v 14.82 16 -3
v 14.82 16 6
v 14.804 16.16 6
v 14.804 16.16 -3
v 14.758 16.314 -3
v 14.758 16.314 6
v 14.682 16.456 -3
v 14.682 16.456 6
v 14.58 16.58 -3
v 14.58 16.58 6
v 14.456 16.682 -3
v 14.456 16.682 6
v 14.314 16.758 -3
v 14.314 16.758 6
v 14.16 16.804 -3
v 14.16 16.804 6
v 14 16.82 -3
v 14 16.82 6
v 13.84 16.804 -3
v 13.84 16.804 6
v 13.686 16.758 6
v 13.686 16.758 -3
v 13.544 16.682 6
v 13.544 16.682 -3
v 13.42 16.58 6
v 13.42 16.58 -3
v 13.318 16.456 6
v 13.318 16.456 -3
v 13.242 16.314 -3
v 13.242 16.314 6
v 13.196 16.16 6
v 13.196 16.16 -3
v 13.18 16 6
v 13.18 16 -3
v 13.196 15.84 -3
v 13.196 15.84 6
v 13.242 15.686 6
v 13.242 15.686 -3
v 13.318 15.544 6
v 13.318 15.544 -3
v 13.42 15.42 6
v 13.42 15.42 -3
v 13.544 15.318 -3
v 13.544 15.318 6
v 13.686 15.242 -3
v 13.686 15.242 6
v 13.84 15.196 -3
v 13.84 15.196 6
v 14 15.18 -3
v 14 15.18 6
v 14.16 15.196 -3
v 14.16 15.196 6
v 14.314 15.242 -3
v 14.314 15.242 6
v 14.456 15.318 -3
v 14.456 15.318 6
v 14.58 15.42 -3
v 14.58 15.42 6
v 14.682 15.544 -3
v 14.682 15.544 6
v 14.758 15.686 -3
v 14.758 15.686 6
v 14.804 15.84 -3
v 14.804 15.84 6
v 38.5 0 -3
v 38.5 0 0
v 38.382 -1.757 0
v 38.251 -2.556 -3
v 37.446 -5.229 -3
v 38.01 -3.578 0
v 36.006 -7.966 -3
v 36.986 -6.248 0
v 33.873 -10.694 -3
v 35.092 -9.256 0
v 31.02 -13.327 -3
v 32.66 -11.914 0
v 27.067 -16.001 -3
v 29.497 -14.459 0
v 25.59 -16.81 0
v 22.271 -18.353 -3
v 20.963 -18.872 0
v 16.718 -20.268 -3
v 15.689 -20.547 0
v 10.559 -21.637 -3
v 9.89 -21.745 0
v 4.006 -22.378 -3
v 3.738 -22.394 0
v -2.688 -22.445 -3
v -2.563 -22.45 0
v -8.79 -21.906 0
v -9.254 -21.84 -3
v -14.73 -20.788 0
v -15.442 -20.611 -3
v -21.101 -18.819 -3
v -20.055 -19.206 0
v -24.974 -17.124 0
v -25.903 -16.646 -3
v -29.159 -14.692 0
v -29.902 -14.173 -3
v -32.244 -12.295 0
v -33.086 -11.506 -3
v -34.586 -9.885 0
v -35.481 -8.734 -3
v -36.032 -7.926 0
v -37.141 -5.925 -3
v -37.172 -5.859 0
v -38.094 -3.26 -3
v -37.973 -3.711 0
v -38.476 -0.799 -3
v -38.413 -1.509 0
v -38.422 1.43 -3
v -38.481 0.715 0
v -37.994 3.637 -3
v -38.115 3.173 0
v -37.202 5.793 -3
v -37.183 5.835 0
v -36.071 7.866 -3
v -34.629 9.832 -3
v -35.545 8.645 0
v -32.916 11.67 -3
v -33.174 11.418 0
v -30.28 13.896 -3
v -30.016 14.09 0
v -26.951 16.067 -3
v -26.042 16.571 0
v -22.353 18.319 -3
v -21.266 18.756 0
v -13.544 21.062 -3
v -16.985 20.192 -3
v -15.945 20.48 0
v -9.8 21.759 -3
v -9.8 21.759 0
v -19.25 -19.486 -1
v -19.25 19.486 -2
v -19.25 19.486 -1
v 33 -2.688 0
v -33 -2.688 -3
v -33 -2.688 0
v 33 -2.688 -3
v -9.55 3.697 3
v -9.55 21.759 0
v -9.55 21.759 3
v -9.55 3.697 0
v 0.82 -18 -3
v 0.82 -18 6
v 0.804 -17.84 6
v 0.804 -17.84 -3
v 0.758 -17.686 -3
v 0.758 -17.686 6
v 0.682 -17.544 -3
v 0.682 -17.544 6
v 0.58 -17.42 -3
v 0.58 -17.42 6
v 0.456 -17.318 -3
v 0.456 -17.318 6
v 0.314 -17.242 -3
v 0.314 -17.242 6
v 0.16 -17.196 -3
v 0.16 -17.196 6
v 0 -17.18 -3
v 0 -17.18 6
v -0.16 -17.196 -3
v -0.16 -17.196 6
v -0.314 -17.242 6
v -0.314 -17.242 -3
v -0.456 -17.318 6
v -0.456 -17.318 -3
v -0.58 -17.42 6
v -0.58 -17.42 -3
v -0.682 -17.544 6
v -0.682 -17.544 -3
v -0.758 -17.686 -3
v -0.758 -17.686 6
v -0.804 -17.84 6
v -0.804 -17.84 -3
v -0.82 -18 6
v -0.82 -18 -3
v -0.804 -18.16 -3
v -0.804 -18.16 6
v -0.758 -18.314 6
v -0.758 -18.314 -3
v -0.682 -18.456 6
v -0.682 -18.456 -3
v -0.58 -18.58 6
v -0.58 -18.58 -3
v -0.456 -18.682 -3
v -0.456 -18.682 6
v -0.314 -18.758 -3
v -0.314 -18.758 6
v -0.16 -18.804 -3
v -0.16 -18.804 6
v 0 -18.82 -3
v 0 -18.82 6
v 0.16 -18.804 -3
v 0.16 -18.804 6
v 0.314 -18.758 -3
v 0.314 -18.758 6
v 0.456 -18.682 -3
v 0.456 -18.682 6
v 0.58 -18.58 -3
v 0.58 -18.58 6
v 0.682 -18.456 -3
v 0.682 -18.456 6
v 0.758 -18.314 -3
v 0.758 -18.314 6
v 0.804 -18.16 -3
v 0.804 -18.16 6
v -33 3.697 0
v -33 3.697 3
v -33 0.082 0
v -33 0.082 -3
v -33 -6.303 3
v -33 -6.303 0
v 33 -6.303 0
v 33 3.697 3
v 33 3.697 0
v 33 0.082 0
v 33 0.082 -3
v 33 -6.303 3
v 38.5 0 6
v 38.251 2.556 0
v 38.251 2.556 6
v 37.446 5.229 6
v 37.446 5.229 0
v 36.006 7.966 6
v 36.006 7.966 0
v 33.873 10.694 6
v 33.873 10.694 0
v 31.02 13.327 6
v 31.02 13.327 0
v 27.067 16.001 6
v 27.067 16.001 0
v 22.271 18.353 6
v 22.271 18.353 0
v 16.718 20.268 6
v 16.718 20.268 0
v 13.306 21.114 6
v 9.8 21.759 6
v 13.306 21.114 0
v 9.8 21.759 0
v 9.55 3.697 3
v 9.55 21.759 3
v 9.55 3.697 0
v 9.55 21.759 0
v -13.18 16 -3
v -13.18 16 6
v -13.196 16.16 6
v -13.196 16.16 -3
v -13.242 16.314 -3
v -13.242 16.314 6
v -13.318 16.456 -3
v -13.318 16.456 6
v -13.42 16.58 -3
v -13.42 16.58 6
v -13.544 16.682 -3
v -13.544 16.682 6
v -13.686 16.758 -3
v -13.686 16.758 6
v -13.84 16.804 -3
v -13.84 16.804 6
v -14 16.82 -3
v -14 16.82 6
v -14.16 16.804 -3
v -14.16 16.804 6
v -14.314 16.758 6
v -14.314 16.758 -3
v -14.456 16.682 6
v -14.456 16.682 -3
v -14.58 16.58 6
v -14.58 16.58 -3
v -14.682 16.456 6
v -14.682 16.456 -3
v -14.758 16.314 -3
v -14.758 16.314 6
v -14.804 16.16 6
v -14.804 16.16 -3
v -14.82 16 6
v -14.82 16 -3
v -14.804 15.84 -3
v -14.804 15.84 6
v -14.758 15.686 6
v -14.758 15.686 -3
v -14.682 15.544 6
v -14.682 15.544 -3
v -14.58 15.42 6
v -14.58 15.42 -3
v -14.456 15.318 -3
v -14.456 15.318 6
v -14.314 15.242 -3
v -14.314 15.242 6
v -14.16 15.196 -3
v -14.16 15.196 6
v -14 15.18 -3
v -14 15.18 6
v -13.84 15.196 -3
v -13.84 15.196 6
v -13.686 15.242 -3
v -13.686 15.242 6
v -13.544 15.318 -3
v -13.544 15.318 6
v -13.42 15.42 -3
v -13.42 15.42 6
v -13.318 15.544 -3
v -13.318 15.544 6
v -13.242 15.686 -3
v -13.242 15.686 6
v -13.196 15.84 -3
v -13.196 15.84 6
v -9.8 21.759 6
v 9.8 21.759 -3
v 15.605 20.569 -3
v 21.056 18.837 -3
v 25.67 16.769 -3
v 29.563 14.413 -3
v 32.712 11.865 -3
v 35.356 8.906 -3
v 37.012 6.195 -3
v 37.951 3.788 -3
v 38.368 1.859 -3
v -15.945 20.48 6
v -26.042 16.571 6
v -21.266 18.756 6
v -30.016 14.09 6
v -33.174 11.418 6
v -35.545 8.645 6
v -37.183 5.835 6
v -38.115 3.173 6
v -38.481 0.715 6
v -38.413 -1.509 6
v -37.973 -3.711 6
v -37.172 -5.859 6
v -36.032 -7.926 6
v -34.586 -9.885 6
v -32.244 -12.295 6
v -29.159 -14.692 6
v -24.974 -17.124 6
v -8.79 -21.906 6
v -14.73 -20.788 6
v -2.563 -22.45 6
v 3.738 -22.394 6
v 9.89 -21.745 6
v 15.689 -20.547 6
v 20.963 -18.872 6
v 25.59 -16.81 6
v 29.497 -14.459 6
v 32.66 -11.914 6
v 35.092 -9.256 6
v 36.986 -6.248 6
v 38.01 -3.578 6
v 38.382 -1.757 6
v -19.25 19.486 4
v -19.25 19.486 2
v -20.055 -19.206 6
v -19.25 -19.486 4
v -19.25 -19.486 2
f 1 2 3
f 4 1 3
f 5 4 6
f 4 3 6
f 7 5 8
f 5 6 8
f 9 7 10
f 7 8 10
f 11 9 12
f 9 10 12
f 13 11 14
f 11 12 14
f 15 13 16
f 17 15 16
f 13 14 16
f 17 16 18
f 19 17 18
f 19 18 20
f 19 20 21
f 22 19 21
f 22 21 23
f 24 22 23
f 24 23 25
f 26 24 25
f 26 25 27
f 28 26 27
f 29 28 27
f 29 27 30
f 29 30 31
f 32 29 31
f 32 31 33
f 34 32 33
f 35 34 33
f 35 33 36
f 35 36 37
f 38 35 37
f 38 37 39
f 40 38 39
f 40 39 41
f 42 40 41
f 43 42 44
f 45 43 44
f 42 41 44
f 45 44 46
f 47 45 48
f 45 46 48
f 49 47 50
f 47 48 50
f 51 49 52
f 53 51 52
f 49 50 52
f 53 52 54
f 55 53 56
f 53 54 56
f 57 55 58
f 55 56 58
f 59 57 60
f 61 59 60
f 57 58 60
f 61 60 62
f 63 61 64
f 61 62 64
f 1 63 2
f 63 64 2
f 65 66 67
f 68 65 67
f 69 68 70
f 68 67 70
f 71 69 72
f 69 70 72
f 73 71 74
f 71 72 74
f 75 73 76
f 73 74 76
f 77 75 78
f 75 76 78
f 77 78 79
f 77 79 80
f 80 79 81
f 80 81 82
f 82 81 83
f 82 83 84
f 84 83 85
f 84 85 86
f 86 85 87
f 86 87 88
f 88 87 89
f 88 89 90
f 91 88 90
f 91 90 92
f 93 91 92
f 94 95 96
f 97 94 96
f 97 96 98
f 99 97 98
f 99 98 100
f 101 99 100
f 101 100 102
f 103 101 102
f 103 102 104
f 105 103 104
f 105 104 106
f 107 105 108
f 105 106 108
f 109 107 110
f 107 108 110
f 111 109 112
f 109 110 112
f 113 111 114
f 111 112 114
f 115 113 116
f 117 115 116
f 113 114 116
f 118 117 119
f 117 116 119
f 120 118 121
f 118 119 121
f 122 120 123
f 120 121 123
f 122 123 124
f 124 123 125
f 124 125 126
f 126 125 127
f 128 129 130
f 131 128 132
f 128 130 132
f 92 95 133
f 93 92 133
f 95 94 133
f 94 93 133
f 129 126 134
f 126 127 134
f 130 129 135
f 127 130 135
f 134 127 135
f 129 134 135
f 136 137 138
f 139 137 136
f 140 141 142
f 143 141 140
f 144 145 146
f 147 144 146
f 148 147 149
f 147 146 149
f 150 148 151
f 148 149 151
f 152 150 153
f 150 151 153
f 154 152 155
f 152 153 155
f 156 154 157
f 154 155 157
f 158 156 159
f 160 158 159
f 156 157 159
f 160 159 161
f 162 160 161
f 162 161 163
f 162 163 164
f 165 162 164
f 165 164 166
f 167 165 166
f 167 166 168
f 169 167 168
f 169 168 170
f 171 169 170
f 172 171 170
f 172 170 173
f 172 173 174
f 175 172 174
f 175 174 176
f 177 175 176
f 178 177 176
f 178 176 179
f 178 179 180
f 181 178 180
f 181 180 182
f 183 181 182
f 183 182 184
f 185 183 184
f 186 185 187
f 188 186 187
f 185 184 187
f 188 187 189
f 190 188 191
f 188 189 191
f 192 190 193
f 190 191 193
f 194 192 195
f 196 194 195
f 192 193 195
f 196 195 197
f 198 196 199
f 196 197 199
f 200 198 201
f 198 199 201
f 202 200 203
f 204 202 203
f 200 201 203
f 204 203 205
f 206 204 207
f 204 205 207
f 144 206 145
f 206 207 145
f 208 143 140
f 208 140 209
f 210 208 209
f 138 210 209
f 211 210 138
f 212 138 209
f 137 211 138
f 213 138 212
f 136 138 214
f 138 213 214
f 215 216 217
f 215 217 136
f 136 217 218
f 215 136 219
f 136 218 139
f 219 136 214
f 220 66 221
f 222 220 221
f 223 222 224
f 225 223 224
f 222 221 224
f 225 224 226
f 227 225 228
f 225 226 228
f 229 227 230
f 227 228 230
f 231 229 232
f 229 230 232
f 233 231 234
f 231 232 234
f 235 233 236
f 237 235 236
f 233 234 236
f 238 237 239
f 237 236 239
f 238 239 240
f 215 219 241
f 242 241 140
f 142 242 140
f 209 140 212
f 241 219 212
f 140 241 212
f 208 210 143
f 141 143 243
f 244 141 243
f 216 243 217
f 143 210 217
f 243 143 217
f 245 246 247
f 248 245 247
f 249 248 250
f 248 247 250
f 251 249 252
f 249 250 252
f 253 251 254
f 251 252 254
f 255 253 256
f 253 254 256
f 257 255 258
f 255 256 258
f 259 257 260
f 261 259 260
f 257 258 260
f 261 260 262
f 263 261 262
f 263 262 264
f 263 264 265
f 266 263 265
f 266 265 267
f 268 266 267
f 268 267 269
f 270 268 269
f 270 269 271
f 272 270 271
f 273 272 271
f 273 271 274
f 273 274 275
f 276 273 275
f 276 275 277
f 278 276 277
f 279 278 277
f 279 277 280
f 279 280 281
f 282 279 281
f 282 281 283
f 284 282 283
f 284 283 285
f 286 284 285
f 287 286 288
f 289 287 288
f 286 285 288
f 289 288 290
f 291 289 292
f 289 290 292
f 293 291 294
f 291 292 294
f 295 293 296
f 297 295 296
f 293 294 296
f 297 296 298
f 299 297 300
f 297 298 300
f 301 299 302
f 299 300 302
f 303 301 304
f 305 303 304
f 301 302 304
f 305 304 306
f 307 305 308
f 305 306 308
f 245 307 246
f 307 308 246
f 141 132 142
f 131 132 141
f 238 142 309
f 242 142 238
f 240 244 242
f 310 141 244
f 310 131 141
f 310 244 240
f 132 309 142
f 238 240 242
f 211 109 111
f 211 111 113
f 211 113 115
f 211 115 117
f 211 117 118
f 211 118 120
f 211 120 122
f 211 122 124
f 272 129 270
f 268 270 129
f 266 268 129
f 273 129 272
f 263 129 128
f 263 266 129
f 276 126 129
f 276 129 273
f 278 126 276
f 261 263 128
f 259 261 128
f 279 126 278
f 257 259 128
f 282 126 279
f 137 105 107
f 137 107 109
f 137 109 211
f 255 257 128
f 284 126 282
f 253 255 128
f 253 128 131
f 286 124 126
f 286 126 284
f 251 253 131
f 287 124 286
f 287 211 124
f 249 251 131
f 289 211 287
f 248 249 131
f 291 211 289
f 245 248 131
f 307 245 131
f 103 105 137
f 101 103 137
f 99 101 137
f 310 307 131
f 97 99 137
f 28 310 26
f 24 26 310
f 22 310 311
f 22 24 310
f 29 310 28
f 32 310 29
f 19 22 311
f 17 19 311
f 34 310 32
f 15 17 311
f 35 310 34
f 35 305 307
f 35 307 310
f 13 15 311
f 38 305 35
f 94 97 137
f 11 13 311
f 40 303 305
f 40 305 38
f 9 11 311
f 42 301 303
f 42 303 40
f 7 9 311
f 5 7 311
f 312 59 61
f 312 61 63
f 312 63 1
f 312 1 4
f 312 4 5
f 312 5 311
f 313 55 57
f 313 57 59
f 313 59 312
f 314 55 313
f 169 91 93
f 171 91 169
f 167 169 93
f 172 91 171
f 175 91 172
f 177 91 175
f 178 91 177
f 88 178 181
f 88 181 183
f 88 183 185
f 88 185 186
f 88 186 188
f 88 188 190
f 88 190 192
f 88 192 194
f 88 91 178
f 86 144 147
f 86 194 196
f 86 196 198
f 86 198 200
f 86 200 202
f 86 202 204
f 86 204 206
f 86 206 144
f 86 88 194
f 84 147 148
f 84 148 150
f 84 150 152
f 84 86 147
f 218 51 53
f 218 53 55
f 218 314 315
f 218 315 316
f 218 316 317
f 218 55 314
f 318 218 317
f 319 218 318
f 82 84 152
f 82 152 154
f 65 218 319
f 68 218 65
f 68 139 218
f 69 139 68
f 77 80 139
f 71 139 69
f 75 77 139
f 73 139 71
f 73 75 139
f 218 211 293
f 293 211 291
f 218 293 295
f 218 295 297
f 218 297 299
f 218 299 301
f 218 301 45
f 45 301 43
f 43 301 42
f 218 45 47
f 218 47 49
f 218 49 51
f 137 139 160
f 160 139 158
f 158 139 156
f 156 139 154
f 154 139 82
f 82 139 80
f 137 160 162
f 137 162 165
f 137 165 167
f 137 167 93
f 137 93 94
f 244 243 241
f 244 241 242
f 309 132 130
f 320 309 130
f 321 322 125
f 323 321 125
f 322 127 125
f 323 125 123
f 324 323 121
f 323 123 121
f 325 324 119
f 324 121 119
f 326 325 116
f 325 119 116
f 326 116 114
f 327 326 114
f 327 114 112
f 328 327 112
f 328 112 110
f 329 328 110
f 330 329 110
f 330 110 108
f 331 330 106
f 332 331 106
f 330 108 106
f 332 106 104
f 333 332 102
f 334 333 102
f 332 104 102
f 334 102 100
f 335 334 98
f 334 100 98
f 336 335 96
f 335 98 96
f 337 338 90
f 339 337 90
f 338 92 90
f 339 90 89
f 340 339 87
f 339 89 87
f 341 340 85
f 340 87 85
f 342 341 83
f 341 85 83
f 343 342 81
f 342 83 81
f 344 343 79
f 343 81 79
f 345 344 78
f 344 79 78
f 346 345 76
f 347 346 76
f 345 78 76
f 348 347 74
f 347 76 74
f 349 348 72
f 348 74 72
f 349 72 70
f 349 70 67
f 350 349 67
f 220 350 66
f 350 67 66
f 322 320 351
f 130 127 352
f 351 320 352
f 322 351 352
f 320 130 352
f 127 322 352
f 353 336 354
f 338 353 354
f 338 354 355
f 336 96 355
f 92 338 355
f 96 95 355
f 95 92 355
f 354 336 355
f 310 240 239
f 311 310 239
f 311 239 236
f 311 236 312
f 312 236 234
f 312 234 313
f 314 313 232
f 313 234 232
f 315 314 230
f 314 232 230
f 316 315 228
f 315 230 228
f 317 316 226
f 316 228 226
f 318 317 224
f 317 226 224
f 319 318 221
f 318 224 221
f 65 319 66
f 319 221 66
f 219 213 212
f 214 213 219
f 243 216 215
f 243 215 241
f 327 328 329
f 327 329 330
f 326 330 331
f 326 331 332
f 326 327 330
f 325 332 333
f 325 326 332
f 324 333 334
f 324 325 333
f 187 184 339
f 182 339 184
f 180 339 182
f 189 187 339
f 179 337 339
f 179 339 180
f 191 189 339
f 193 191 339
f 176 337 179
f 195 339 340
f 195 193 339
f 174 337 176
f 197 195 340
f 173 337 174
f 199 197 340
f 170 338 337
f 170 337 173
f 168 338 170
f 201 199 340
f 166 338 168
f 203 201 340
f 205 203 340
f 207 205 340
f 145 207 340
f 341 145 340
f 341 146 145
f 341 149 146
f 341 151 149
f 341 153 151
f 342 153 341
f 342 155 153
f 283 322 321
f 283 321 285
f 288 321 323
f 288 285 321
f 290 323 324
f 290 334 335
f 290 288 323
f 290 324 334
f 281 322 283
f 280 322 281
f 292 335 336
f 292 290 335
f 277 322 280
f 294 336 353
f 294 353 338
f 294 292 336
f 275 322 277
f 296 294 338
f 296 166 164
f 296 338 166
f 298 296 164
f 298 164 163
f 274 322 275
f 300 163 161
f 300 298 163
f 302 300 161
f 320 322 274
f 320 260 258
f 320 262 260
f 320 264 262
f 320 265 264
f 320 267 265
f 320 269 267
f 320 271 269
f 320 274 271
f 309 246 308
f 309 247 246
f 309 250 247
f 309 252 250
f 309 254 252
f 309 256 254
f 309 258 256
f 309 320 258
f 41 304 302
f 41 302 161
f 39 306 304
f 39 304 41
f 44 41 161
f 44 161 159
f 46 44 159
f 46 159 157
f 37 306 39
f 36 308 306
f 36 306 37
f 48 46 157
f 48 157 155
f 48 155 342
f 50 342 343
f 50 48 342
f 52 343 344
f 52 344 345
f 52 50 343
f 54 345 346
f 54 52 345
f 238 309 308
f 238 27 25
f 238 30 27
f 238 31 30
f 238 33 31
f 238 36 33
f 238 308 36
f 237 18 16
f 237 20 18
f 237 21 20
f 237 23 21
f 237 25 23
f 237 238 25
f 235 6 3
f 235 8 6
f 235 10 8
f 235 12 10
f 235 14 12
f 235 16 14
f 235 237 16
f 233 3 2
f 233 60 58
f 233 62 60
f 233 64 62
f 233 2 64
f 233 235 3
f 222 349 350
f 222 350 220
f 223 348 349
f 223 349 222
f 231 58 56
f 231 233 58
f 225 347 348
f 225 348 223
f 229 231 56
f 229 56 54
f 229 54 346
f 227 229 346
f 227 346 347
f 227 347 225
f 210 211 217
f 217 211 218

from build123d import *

# Parameters (mm, degrees)
PAD_DEPTH       = 6
POCKET_DEPTH    = 3
PAD001_DEPTH    = 3
SKETCH003_W     = 66
SKETCH003_H     = 2.77
POCKET001_DEPTH = 3
SKETCH004_W     = 19.6
SKETCH004_H     = 1
POCKET002_DEPTH = 9.001
SKETCH005_R     = 0.82
POCKET003_DEPTH = 9.001


with BuildPart() as part:
    # Sketch → Pad (new body)
    with BuildSketch(Plane.XY):
        with BuildLine():
            add(Edge.make_bspline(
                [(38.5, 0), (38.5, 38.971143), (-19.25, 19.485572), (-77, 0), (-19.25, -19.485572), (38.5, -38.971143), (38.5, 0)],
                knots=[0, 0, 0, 2.094395, 2.094395, 4.18879, 4.18879, 6.283185, 6.283185, 6.283185], degree=2, weights=[1, 0.5, 1, 0.5, 1, 0.5, 1]))
        make_face()
    extrude(amount=PAD_DEPTH)

    # Sketch001 (on Face2 of Pad) → Pocket (cut)
    with BuildSketch(Plane(origin=(0, 0, 0), x_dir=(1, 0, 0), z_dir=(0, 0, -1))):
        Polygon((9.55, -3.696801), (9.55, -21.796801), (-9.55, -21.796801), (-9.55, -3.696801), (-33, -3.696801), (-33, 6.303199), (33, 6.303199), (33, -3.696801), align=None)
    extrude(amount=-POCKET_DEPTH, mode=Mode.SUBTRACT)

    # Sketch002 (on Face2 of Pocket) → Pad001 (join)
    with BuildSketch(Plane(origin=(0, 0, 0), x_dir=(1, 0, 0), z_dir=(0, 0, -1))):
        with BuildLine():
            add(Edge.make_bspline(
                [(38.5, 0), (38.5, 38.971143), (-19.25, 19.485572), (-77, 0), (-19.25, -19.485572), (38.5, -38.971143), (38.5, 0)],
                knots=[0, 0, 0, 2.094395, 2.094395, 4.18879, 4.18879, 6.283185, 6.283185, 6.283185], degree=2, weights=[1, 0.5, 1, 0.5, 1, 0.5, 1]))
        make_face()
    extrude(amount=PAD001_DEPTH)

    # Sketch003 (on Face4 of Pad001) → Pocket001 (cut)
    with BuildSketch(Plane(origin=(0, 0, -3), x_dir=(1, 0, 0), z_dir=(0, 0, -1))):
        with Locations((0, 1.303199)):
            Rectangle(SKETCH003_W, SKETCH003_H)
    extrude(amount=-POCKET001_DEPTH, mode=Mode.SUBTRACT)

    # Sketch004 (on Face4 of Pocket001) → Pocket002 (cut, through all)
    with BuildSketch(Plane(origin=(0, 0, -3), x_dir=(1, 0, 0), z_dir=(0, 0, -1))):
        with Locations((0, -22.258868)):
            Rectangle(SKETCH004_W, SKETCH004_H)
    extrude(amount=-POCKET002_DEPTH, mode=Mode.SUBTRACT)

    # Sketch005 (on Face4 of Pocket002) → Pocket003 (cut, through all)
    with BuildSketch(Plane.XY.offset(6)):
        with Locations((-14, 16)):
            Circle(SKETCH005_R)
        with Locations((14, 16)):
            Circle(SKETCH005_R)
        with Locations((0, -18)):
            Circle(SKETCH005_R)
    extrude(amount=-POCKET003_DEPTH, mode=Mode.SUBTRACT)


solid = part.part
